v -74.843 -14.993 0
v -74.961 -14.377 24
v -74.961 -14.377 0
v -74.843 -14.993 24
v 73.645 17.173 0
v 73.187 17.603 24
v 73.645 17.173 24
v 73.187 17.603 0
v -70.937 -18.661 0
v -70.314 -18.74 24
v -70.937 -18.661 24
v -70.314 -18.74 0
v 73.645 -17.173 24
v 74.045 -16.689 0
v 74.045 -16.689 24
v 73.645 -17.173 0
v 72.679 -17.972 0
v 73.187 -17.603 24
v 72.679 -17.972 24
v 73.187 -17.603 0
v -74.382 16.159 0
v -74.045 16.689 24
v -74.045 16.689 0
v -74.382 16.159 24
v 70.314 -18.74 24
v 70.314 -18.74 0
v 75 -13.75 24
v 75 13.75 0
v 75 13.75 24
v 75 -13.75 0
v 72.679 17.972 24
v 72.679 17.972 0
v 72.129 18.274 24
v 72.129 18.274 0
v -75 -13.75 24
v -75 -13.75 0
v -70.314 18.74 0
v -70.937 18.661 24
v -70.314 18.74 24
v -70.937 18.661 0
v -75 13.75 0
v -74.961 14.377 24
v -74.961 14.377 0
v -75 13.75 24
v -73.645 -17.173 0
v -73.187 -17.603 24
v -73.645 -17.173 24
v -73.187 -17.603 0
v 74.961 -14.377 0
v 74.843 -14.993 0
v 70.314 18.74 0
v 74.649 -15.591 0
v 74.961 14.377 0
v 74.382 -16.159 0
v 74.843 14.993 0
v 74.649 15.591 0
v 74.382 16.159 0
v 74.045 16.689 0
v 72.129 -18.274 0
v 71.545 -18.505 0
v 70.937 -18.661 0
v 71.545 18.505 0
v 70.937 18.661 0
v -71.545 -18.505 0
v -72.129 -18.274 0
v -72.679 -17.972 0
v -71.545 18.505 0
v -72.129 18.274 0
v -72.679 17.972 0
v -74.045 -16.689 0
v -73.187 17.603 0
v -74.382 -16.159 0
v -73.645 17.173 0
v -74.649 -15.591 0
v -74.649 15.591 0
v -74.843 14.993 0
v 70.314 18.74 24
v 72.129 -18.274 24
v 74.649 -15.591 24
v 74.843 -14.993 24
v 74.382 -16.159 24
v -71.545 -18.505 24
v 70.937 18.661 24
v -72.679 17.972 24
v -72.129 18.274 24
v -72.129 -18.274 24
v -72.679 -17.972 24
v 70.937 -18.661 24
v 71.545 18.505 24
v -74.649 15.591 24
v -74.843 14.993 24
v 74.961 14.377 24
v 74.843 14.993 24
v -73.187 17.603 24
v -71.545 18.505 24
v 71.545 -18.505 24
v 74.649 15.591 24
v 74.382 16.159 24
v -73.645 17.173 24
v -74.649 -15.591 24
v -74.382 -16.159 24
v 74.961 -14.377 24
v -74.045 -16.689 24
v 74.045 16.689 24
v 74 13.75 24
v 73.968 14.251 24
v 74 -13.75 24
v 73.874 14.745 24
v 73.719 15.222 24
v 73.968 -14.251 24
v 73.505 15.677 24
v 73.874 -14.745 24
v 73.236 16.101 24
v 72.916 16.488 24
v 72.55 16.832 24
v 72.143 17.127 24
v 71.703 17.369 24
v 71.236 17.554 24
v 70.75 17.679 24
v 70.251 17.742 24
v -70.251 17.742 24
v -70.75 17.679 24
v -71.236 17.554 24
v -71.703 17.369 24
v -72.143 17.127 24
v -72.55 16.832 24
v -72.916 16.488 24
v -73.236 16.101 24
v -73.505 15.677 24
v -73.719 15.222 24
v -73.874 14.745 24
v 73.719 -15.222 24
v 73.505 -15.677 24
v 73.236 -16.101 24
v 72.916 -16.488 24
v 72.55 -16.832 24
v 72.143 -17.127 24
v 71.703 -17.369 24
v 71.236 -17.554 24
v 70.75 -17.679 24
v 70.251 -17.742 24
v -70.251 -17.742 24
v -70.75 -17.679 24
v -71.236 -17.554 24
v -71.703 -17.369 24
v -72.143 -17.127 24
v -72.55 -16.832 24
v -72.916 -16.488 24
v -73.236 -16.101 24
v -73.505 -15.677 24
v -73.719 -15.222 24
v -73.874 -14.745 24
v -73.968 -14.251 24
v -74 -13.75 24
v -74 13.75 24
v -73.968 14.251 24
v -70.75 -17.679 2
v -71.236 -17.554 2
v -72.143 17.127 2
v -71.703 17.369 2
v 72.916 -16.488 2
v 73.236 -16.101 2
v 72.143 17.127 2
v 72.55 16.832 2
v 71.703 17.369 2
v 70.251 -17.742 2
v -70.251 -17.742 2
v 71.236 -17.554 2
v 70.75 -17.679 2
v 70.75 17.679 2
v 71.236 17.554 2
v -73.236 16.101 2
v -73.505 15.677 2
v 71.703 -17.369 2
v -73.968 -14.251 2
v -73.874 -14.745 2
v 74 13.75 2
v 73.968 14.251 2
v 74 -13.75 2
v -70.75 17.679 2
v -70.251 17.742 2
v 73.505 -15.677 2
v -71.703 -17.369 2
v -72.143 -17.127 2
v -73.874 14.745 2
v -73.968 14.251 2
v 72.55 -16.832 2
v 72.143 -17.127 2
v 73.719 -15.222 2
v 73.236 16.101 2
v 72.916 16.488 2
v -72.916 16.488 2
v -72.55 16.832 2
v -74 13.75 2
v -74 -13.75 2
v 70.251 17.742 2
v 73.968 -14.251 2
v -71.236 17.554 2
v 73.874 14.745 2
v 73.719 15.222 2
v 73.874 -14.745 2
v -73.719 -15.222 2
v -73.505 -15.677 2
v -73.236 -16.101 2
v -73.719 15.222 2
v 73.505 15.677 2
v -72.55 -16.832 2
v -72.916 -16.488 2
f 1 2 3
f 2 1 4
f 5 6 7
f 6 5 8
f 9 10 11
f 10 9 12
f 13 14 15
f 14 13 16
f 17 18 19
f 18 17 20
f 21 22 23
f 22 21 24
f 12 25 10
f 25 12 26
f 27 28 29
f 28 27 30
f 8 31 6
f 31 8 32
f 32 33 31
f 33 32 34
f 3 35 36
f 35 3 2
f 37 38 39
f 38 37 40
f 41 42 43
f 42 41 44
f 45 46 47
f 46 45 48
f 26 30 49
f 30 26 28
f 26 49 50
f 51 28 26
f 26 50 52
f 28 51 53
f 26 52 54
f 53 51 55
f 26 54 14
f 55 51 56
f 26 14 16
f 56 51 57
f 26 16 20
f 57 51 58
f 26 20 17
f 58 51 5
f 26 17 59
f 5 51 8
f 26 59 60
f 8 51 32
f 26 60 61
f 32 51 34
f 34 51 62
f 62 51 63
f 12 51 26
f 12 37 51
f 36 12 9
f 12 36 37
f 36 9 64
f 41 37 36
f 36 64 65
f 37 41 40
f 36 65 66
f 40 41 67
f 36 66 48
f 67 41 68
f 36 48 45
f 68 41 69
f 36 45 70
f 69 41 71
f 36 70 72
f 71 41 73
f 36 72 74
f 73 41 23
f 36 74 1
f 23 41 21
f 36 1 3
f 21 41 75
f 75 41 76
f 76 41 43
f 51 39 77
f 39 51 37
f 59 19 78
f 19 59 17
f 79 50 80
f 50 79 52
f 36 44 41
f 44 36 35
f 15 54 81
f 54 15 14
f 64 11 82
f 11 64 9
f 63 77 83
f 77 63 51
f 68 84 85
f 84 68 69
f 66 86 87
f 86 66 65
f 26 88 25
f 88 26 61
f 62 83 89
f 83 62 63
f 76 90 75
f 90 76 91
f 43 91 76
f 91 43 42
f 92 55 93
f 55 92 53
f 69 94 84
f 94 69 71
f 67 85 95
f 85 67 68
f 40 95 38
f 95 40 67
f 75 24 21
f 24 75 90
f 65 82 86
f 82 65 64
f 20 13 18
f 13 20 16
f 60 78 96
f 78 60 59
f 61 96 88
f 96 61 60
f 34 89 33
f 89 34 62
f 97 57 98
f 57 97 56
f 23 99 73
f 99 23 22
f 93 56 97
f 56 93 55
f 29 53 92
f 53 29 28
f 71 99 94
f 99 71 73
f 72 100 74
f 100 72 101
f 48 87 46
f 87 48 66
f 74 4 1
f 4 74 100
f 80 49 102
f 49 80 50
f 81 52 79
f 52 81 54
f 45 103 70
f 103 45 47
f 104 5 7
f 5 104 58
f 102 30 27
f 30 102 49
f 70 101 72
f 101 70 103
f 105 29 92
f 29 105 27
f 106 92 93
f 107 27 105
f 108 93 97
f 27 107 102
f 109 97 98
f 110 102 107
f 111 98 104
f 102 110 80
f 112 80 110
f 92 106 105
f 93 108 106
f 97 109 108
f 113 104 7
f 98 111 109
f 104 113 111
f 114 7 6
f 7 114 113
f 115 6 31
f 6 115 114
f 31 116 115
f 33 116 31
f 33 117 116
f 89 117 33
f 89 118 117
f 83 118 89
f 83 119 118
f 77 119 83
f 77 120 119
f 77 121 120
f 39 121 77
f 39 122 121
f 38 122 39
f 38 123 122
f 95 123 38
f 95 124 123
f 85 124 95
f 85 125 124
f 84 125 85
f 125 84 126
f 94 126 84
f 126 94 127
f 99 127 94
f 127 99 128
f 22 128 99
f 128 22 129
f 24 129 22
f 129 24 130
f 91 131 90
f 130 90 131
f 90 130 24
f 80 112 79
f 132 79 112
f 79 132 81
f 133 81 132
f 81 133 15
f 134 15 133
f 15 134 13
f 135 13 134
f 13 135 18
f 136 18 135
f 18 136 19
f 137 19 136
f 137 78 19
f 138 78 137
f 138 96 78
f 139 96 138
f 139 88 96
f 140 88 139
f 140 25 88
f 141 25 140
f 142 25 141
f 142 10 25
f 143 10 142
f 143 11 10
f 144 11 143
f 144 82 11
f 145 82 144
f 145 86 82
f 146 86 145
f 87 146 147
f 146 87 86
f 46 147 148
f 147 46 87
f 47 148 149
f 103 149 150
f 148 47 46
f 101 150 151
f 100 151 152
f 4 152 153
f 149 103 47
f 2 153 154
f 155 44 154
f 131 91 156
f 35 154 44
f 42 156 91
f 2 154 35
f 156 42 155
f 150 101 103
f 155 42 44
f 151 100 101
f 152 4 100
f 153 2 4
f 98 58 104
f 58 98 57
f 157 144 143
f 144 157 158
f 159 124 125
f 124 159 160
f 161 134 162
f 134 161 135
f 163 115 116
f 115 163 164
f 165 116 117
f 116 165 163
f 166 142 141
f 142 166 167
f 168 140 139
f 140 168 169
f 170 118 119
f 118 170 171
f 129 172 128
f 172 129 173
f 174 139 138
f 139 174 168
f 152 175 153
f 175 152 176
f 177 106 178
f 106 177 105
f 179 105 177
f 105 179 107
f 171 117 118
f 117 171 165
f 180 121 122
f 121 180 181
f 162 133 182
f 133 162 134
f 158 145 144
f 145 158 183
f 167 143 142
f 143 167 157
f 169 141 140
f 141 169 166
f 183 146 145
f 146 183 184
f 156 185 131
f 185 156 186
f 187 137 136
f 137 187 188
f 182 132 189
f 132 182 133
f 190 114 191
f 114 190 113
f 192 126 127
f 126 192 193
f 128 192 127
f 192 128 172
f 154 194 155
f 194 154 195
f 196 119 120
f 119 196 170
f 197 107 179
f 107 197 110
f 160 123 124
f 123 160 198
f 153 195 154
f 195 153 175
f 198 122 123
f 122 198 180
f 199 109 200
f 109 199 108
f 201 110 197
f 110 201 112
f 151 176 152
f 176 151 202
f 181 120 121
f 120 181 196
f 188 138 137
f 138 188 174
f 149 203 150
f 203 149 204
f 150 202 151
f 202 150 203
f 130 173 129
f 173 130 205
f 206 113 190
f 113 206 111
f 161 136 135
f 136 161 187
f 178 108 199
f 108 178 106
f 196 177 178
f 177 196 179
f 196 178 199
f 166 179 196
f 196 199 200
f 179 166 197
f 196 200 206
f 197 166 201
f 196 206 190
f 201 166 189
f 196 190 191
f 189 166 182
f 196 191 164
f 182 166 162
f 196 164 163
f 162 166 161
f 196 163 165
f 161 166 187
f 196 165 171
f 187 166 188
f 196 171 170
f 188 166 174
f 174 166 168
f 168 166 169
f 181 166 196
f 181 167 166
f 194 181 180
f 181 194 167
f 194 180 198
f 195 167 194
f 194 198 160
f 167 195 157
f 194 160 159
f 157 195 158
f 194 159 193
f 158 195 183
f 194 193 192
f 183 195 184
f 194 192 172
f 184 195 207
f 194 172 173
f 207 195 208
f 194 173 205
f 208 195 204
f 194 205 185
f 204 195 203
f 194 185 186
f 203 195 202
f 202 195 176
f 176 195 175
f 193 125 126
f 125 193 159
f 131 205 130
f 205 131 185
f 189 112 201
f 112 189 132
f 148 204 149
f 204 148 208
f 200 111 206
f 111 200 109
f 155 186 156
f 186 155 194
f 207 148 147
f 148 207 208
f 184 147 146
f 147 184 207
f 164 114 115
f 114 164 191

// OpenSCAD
$fn = 50;


difference() {
	union() {
		hull() {
			translate(v = [-70.0000000000, 13.7500000000, 0]) {
				cylinder(h = 24, r = 5);
			}
			translate(v = [70.0000000000, 13.7500000000, 0]) {
				cylinder(h = 24, r = 5);
			}
			translate(v = [-70.0000000000, -13.7500000000, 0]) {
				cylinder(h = 24, r = 5);
			}
			translate(v = [70.0000000000, -13.7500000000, 0]) {
				cylinder(h = 24, r = 5);
			}
		}
	}
	union() {
		translate(v = [0, 0, 2]) {
			hull() {
				translate(v = [-70.0000000000, 13.7500000000, 0]) {
					cylinder(h = 22, r = 4);
				}
				translate(v = [70.0000000000, 13.7500000000, 0]) {
					cylinder(h = 22, r = 4);
				}
				translate(v = [-70.0000000000, -13.7500000000, 0]) {
					cylinder(h = 22, r = 4);
				}
				translate(v = [70.0000000000, -13.7500000000, 0]) {
					cylinder(h = 22, r = 4);
				}
			}
		}
	}
}
